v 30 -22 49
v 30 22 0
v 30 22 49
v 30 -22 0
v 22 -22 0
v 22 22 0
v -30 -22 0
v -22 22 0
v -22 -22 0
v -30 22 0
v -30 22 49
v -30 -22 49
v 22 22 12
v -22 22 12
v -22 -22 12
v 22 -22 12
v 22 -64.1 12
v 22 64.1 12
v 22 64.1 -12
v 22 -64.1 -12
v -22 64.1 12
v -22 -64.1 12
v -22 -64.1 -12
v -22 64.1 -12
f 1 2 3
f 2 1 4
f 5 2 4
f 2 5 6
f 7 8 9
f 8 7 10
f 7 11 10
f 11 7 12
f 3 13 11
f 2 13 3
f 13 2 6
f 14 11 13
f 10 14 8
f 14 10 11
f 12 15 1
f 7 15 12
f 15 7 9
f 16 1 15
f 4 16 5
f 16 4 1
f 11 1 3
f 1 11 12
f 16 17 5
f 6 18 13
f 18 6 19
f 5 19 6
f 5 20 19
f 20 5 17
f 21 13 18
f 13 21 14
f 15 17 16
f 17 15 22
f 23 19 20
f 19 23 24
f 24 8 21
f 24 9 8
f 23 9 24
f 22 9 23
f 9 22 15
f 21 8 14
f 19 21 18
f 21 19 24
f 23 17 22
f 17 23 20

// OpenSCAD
// file: Parts/Screw.scad
// created by IndiePandaaaaa | Lukas

TOLERANCE = .1;
$fn = $preview ? 30 : 75;

// metric standards                          M1   M2   M3   M4   M5 M6 M7   M8   M9  M10
function screw_metric_corehole(standard) = [.75, 1.6, 2.5, 3.3, 4.2, 5, 6, 6.8, 7.8, 8.5][standard - 1];
function screw_metric_borehole(standard) = [0, 0, 3.4, 4.5, 5.5, 6.6, 0, 9, 0, 11][standard - 1];
function screw_metric_countersunk_height(standard) = [0, 0, 1.7, 2.3, 2.8, 3.3, 0, 4.4, 0, 5.5][standard - 1];
function screw_metric_countersunk_od(standard) = standard * 2;

module screw_metric_countersunk(standard, length, unthreaded_length = 0, borehole_length = 0, tolerance = .15) {
  if (screw_metric_corehole(standard=standard) == 0) echo("ERROR: screw_metric_corehole value has not been set yet.");
  if (screw_metric_borehole(standard=standard) == 0) echo("ERROR: screw_metric_borehole value has not been set yet.");
  if (screw_metric_countersunk_height(standard=standard) == 0) echo("ERROR: screw_metric_countersunk_height value has not been set yet.");

  union() {
    translate(v=[0, 0, -.1]) {
      cylinder(h=.2 + borehole_length, d=screw_metric_countersunk_od(standard) + tolerance, center=false);
      translate(v=[0, 0, -screw_metric_countersunk_height(standard)]) {
        cylinder(h=screw_metric_countersunk_height(standard) + .01, d2=screw_metric_countersunk_od(standard) + tolerance, d1=screw_metric_borehole(standard) + tolerance, center=false);
        translate(v=[0, 0, -.1]) cylinder(h=.1, d=screw_metric_borehole(standard) + tolerance, center=false);
      }
    }
    translate(v=[0, 0, -length]) cylinder(h=length, d=screw_metric_corehole(standard) + tolerance, center=false);

    // unthreaded part
    translate(v=[0, 0, -.1 - screw_metric_countersunk_height(standard) - unthreaded_length]) cylinder(h=unthreaded_length + .1, d=screw_metric_borehole(standard) + tolerance, center=false);
  }
}

// TODO: module metric cylindric head screws

// TODO: module metric rounded head screws

function screw_wood_corehole(diameter) = diameter * 0.75;
function screw_wood_borehole(diameter) = diameter * 1.25;
function screw_wood_countersunk_height(diameter) = diameter * 0.75;

module screw_wood_countersunk(diameter, length, unthreaded_length = 0, tolerance = .15) {
  if (screw_metric_corehole(standard=standard) == 0) echo("ERROR: screw_metric_corehole value has not been set yet.");
  if (screw_metric_borehole(standard=standard) == 0) echo("ERROR: screw_metric_borehole value has not been set yet.");
  if (screw_metric_countersunk_height(standard=standard) == 0) echo("ERROR: screw_metric_countersunk_height value has not been set yet.");

  // TODO: add module for wood screws 
  union(){}
}

// TODO: module wood cylindric head screws

// TODO: module wood rounded head screws

function cone_diameter(diameter) = diameter * 2;
function cone_diameter_cutout(diameter) = diameter * 2 + 0.5;
function cone_height(diameter) = diameter * 0.75;

module screw(diameter, length = 12, cutout_sample = false) {
  module base_model(diameter, length, cone_height, cone_diameter, offset = 0) {
    rotate_extrude(angle=360) {
      polygon(
        [
          [0, 0],
          [(diameter + offset) / 2, 0],
          [(diameter + offset) / 2, (length + offset) - (cone_height + offset)],
          [(cone_diameter + offset) / 2, length + offset],
          [0, length + offset],
        ]
      );
    }
  }

  if (length < diameter) {
    echo("Screw is too short");
    length = diameter + 5;
    echo("New length is: ", length);
  }

  if (!cutout_sample) {
    translate([0, 0, -length])
      difference() {
        base_model(diameter, length, cone_height(diameter), cone_diameter(diameter));

        // top cross part
        translate([0, 0, length - (cone_height(diameter) - diameter / 2) + .1])
          difference() {
            rotate([0, 0, 45])
              rotate_extrude(angle=360) {
                polygon(
                  [
                    [0, 0],
                    [diameter * 1.4 / 2, 0],
                    [cone_diameter(diameter) / 3, cone_height(diameter) - diameter / 2],
                    [0, cone_height(diameter) - diameter / 2],
                  ]
                );
              }
            for (i = [0:1:3]) {
              rotate([0, 0, 90 * i])
                translate([diameter / 3.18 / 2, diameter / 3.18 / 2, 0]) cube(cone_height(diameter));
            }
          }
      }
  } else {
    offset = 0;
    diameter = cone_diameter_cutout(diameter) / 2; // is duplicated by function, used to reduce error
    translate([0, 0, -length - offset / 2]) {
      base_model(diameter, length, cone_height(diameter), cone_diameter(diameter), offset);
      translate([0, 0, length - .005]) cylinder(r=diameter, h=50);
    }
  }
}

module screw_corehole(diameter_screw, diameter_core, unthreaded_length, length = 12) {
  union() {
    screw(diameter=diameter_screw, length=unthreaded_length, cutout_sample=true);
    if (unthreaded_length < diameter_core - .1) {
      translate(v=[0, 0, -diameter_screw * .8]) cylinder(h=diameter_screw, d=diameter_screw + .3, center=false);
    }
    translate([0, 0, -length]) cylinder(d=diameter_core, h=length - unthreaded_length + .1);
  }
}

module screw_with_nut(screw_length, diameter, square_channel = false, tolerance = .1) {
  function od(width) = ( (width / 2) / cos(30)) * 2; // calculates nut diameter from given width
  nut_thickness = [0.8, 1.6, 2.4, 3.2, 4, 5, 5.5, 6.5];
  nut_width = [2.5, 4, 5.5, 7.1, 8.1, 10.1, 11.1, 13.1];

  if (!(0 < diameter && diameter <= 8 && diameter == round(diameter))) {
    echo("module is only defined for integer values from M1 to M8.");
  } else {
    union() {
      if (!square_channel) {
        screw(diameter=diameter, length=screw_length, cutout_sample=true);

        translate([0, 0, -(screw_length * 2 - nut_thickness[diameter - 1])])
          cylinder(d=od(nut_width[diameter - 1]) + tolerance, h=screw_length, $fn=6);
      } else {
        screw(diameter=diameter, length=screw_length + diameter, cutout_sample=true);
        translate([-od(nut_width[diameter - 1]) / 2 - tolerance, -(nut_width[diameter - 1] / 2), -(screw_length)])
          cube([od(nut_width[diameter - 1]) + screw_length, nut_width[diameter - 1] + tolerance, nut_thickness[diameter - 1] + tolerance]);
      }
    }
  }
}

translate(v=[0, 0, 0]) screw(diameter=3.5, length=12, cutout_sample=false);
translate(v=[20, 0, 0]) screw_corehole(diameter_screw=3, diameter_core=2.5, unthreaded_length=15, length=20);
translate(v=[40, 0, 0]) screw_with_nut(screw_length=30, diameter=4, square_channel=false, tolerance=.1);
translate(v=[60, 0, 0]) SCREW_METRIC_COUNTERSUNK(standard=3, length=12, unthreaded_length=5, borehole_length=5);
// main file
// created by IndiePandaaaaa|Lukas
// encoding: utf-8

use <Parts/Screw.scad>

thickness = 3;
$fn = $preview ? 25 : 125;

transferBit = [25, 5, 16]; // [cutting bit height, bearing height, bit diameter]
supportWidth = 42;

uLatte = [44, 24];

// TODO: Maße uLatte in das Modell schreiben als Text
// TODO: Ausleger für Zwingenmontage

union() {
  //  cube(size=[uLatte[0] + supportWidth * 2, uLatte[0] + supportWidth * 2, thickness], center=true);
  color(c="brown", alpha=1.0) cube(size=[uLatte[0], uLatte[0] + supportWidth * 2 + .2, uLatte[1]], center=true);
  color(c="darkgrey", alpha=1.0) {
    translate(v=[0, 0, uLatte[1] / 4 + .1]) cube(size=[uLatte[0] + transferBit[2], uLatte[0], uLatte[1] / 2 + .2], center=true);
    translate(v=[0, 0, (uLatte[1] + transferBit[0]) / 2]) cube(size=[uLatte[0] + transferBit[2], uLatte[0], uLatte[1] + transferBit[0]], center=true);
  }
}
